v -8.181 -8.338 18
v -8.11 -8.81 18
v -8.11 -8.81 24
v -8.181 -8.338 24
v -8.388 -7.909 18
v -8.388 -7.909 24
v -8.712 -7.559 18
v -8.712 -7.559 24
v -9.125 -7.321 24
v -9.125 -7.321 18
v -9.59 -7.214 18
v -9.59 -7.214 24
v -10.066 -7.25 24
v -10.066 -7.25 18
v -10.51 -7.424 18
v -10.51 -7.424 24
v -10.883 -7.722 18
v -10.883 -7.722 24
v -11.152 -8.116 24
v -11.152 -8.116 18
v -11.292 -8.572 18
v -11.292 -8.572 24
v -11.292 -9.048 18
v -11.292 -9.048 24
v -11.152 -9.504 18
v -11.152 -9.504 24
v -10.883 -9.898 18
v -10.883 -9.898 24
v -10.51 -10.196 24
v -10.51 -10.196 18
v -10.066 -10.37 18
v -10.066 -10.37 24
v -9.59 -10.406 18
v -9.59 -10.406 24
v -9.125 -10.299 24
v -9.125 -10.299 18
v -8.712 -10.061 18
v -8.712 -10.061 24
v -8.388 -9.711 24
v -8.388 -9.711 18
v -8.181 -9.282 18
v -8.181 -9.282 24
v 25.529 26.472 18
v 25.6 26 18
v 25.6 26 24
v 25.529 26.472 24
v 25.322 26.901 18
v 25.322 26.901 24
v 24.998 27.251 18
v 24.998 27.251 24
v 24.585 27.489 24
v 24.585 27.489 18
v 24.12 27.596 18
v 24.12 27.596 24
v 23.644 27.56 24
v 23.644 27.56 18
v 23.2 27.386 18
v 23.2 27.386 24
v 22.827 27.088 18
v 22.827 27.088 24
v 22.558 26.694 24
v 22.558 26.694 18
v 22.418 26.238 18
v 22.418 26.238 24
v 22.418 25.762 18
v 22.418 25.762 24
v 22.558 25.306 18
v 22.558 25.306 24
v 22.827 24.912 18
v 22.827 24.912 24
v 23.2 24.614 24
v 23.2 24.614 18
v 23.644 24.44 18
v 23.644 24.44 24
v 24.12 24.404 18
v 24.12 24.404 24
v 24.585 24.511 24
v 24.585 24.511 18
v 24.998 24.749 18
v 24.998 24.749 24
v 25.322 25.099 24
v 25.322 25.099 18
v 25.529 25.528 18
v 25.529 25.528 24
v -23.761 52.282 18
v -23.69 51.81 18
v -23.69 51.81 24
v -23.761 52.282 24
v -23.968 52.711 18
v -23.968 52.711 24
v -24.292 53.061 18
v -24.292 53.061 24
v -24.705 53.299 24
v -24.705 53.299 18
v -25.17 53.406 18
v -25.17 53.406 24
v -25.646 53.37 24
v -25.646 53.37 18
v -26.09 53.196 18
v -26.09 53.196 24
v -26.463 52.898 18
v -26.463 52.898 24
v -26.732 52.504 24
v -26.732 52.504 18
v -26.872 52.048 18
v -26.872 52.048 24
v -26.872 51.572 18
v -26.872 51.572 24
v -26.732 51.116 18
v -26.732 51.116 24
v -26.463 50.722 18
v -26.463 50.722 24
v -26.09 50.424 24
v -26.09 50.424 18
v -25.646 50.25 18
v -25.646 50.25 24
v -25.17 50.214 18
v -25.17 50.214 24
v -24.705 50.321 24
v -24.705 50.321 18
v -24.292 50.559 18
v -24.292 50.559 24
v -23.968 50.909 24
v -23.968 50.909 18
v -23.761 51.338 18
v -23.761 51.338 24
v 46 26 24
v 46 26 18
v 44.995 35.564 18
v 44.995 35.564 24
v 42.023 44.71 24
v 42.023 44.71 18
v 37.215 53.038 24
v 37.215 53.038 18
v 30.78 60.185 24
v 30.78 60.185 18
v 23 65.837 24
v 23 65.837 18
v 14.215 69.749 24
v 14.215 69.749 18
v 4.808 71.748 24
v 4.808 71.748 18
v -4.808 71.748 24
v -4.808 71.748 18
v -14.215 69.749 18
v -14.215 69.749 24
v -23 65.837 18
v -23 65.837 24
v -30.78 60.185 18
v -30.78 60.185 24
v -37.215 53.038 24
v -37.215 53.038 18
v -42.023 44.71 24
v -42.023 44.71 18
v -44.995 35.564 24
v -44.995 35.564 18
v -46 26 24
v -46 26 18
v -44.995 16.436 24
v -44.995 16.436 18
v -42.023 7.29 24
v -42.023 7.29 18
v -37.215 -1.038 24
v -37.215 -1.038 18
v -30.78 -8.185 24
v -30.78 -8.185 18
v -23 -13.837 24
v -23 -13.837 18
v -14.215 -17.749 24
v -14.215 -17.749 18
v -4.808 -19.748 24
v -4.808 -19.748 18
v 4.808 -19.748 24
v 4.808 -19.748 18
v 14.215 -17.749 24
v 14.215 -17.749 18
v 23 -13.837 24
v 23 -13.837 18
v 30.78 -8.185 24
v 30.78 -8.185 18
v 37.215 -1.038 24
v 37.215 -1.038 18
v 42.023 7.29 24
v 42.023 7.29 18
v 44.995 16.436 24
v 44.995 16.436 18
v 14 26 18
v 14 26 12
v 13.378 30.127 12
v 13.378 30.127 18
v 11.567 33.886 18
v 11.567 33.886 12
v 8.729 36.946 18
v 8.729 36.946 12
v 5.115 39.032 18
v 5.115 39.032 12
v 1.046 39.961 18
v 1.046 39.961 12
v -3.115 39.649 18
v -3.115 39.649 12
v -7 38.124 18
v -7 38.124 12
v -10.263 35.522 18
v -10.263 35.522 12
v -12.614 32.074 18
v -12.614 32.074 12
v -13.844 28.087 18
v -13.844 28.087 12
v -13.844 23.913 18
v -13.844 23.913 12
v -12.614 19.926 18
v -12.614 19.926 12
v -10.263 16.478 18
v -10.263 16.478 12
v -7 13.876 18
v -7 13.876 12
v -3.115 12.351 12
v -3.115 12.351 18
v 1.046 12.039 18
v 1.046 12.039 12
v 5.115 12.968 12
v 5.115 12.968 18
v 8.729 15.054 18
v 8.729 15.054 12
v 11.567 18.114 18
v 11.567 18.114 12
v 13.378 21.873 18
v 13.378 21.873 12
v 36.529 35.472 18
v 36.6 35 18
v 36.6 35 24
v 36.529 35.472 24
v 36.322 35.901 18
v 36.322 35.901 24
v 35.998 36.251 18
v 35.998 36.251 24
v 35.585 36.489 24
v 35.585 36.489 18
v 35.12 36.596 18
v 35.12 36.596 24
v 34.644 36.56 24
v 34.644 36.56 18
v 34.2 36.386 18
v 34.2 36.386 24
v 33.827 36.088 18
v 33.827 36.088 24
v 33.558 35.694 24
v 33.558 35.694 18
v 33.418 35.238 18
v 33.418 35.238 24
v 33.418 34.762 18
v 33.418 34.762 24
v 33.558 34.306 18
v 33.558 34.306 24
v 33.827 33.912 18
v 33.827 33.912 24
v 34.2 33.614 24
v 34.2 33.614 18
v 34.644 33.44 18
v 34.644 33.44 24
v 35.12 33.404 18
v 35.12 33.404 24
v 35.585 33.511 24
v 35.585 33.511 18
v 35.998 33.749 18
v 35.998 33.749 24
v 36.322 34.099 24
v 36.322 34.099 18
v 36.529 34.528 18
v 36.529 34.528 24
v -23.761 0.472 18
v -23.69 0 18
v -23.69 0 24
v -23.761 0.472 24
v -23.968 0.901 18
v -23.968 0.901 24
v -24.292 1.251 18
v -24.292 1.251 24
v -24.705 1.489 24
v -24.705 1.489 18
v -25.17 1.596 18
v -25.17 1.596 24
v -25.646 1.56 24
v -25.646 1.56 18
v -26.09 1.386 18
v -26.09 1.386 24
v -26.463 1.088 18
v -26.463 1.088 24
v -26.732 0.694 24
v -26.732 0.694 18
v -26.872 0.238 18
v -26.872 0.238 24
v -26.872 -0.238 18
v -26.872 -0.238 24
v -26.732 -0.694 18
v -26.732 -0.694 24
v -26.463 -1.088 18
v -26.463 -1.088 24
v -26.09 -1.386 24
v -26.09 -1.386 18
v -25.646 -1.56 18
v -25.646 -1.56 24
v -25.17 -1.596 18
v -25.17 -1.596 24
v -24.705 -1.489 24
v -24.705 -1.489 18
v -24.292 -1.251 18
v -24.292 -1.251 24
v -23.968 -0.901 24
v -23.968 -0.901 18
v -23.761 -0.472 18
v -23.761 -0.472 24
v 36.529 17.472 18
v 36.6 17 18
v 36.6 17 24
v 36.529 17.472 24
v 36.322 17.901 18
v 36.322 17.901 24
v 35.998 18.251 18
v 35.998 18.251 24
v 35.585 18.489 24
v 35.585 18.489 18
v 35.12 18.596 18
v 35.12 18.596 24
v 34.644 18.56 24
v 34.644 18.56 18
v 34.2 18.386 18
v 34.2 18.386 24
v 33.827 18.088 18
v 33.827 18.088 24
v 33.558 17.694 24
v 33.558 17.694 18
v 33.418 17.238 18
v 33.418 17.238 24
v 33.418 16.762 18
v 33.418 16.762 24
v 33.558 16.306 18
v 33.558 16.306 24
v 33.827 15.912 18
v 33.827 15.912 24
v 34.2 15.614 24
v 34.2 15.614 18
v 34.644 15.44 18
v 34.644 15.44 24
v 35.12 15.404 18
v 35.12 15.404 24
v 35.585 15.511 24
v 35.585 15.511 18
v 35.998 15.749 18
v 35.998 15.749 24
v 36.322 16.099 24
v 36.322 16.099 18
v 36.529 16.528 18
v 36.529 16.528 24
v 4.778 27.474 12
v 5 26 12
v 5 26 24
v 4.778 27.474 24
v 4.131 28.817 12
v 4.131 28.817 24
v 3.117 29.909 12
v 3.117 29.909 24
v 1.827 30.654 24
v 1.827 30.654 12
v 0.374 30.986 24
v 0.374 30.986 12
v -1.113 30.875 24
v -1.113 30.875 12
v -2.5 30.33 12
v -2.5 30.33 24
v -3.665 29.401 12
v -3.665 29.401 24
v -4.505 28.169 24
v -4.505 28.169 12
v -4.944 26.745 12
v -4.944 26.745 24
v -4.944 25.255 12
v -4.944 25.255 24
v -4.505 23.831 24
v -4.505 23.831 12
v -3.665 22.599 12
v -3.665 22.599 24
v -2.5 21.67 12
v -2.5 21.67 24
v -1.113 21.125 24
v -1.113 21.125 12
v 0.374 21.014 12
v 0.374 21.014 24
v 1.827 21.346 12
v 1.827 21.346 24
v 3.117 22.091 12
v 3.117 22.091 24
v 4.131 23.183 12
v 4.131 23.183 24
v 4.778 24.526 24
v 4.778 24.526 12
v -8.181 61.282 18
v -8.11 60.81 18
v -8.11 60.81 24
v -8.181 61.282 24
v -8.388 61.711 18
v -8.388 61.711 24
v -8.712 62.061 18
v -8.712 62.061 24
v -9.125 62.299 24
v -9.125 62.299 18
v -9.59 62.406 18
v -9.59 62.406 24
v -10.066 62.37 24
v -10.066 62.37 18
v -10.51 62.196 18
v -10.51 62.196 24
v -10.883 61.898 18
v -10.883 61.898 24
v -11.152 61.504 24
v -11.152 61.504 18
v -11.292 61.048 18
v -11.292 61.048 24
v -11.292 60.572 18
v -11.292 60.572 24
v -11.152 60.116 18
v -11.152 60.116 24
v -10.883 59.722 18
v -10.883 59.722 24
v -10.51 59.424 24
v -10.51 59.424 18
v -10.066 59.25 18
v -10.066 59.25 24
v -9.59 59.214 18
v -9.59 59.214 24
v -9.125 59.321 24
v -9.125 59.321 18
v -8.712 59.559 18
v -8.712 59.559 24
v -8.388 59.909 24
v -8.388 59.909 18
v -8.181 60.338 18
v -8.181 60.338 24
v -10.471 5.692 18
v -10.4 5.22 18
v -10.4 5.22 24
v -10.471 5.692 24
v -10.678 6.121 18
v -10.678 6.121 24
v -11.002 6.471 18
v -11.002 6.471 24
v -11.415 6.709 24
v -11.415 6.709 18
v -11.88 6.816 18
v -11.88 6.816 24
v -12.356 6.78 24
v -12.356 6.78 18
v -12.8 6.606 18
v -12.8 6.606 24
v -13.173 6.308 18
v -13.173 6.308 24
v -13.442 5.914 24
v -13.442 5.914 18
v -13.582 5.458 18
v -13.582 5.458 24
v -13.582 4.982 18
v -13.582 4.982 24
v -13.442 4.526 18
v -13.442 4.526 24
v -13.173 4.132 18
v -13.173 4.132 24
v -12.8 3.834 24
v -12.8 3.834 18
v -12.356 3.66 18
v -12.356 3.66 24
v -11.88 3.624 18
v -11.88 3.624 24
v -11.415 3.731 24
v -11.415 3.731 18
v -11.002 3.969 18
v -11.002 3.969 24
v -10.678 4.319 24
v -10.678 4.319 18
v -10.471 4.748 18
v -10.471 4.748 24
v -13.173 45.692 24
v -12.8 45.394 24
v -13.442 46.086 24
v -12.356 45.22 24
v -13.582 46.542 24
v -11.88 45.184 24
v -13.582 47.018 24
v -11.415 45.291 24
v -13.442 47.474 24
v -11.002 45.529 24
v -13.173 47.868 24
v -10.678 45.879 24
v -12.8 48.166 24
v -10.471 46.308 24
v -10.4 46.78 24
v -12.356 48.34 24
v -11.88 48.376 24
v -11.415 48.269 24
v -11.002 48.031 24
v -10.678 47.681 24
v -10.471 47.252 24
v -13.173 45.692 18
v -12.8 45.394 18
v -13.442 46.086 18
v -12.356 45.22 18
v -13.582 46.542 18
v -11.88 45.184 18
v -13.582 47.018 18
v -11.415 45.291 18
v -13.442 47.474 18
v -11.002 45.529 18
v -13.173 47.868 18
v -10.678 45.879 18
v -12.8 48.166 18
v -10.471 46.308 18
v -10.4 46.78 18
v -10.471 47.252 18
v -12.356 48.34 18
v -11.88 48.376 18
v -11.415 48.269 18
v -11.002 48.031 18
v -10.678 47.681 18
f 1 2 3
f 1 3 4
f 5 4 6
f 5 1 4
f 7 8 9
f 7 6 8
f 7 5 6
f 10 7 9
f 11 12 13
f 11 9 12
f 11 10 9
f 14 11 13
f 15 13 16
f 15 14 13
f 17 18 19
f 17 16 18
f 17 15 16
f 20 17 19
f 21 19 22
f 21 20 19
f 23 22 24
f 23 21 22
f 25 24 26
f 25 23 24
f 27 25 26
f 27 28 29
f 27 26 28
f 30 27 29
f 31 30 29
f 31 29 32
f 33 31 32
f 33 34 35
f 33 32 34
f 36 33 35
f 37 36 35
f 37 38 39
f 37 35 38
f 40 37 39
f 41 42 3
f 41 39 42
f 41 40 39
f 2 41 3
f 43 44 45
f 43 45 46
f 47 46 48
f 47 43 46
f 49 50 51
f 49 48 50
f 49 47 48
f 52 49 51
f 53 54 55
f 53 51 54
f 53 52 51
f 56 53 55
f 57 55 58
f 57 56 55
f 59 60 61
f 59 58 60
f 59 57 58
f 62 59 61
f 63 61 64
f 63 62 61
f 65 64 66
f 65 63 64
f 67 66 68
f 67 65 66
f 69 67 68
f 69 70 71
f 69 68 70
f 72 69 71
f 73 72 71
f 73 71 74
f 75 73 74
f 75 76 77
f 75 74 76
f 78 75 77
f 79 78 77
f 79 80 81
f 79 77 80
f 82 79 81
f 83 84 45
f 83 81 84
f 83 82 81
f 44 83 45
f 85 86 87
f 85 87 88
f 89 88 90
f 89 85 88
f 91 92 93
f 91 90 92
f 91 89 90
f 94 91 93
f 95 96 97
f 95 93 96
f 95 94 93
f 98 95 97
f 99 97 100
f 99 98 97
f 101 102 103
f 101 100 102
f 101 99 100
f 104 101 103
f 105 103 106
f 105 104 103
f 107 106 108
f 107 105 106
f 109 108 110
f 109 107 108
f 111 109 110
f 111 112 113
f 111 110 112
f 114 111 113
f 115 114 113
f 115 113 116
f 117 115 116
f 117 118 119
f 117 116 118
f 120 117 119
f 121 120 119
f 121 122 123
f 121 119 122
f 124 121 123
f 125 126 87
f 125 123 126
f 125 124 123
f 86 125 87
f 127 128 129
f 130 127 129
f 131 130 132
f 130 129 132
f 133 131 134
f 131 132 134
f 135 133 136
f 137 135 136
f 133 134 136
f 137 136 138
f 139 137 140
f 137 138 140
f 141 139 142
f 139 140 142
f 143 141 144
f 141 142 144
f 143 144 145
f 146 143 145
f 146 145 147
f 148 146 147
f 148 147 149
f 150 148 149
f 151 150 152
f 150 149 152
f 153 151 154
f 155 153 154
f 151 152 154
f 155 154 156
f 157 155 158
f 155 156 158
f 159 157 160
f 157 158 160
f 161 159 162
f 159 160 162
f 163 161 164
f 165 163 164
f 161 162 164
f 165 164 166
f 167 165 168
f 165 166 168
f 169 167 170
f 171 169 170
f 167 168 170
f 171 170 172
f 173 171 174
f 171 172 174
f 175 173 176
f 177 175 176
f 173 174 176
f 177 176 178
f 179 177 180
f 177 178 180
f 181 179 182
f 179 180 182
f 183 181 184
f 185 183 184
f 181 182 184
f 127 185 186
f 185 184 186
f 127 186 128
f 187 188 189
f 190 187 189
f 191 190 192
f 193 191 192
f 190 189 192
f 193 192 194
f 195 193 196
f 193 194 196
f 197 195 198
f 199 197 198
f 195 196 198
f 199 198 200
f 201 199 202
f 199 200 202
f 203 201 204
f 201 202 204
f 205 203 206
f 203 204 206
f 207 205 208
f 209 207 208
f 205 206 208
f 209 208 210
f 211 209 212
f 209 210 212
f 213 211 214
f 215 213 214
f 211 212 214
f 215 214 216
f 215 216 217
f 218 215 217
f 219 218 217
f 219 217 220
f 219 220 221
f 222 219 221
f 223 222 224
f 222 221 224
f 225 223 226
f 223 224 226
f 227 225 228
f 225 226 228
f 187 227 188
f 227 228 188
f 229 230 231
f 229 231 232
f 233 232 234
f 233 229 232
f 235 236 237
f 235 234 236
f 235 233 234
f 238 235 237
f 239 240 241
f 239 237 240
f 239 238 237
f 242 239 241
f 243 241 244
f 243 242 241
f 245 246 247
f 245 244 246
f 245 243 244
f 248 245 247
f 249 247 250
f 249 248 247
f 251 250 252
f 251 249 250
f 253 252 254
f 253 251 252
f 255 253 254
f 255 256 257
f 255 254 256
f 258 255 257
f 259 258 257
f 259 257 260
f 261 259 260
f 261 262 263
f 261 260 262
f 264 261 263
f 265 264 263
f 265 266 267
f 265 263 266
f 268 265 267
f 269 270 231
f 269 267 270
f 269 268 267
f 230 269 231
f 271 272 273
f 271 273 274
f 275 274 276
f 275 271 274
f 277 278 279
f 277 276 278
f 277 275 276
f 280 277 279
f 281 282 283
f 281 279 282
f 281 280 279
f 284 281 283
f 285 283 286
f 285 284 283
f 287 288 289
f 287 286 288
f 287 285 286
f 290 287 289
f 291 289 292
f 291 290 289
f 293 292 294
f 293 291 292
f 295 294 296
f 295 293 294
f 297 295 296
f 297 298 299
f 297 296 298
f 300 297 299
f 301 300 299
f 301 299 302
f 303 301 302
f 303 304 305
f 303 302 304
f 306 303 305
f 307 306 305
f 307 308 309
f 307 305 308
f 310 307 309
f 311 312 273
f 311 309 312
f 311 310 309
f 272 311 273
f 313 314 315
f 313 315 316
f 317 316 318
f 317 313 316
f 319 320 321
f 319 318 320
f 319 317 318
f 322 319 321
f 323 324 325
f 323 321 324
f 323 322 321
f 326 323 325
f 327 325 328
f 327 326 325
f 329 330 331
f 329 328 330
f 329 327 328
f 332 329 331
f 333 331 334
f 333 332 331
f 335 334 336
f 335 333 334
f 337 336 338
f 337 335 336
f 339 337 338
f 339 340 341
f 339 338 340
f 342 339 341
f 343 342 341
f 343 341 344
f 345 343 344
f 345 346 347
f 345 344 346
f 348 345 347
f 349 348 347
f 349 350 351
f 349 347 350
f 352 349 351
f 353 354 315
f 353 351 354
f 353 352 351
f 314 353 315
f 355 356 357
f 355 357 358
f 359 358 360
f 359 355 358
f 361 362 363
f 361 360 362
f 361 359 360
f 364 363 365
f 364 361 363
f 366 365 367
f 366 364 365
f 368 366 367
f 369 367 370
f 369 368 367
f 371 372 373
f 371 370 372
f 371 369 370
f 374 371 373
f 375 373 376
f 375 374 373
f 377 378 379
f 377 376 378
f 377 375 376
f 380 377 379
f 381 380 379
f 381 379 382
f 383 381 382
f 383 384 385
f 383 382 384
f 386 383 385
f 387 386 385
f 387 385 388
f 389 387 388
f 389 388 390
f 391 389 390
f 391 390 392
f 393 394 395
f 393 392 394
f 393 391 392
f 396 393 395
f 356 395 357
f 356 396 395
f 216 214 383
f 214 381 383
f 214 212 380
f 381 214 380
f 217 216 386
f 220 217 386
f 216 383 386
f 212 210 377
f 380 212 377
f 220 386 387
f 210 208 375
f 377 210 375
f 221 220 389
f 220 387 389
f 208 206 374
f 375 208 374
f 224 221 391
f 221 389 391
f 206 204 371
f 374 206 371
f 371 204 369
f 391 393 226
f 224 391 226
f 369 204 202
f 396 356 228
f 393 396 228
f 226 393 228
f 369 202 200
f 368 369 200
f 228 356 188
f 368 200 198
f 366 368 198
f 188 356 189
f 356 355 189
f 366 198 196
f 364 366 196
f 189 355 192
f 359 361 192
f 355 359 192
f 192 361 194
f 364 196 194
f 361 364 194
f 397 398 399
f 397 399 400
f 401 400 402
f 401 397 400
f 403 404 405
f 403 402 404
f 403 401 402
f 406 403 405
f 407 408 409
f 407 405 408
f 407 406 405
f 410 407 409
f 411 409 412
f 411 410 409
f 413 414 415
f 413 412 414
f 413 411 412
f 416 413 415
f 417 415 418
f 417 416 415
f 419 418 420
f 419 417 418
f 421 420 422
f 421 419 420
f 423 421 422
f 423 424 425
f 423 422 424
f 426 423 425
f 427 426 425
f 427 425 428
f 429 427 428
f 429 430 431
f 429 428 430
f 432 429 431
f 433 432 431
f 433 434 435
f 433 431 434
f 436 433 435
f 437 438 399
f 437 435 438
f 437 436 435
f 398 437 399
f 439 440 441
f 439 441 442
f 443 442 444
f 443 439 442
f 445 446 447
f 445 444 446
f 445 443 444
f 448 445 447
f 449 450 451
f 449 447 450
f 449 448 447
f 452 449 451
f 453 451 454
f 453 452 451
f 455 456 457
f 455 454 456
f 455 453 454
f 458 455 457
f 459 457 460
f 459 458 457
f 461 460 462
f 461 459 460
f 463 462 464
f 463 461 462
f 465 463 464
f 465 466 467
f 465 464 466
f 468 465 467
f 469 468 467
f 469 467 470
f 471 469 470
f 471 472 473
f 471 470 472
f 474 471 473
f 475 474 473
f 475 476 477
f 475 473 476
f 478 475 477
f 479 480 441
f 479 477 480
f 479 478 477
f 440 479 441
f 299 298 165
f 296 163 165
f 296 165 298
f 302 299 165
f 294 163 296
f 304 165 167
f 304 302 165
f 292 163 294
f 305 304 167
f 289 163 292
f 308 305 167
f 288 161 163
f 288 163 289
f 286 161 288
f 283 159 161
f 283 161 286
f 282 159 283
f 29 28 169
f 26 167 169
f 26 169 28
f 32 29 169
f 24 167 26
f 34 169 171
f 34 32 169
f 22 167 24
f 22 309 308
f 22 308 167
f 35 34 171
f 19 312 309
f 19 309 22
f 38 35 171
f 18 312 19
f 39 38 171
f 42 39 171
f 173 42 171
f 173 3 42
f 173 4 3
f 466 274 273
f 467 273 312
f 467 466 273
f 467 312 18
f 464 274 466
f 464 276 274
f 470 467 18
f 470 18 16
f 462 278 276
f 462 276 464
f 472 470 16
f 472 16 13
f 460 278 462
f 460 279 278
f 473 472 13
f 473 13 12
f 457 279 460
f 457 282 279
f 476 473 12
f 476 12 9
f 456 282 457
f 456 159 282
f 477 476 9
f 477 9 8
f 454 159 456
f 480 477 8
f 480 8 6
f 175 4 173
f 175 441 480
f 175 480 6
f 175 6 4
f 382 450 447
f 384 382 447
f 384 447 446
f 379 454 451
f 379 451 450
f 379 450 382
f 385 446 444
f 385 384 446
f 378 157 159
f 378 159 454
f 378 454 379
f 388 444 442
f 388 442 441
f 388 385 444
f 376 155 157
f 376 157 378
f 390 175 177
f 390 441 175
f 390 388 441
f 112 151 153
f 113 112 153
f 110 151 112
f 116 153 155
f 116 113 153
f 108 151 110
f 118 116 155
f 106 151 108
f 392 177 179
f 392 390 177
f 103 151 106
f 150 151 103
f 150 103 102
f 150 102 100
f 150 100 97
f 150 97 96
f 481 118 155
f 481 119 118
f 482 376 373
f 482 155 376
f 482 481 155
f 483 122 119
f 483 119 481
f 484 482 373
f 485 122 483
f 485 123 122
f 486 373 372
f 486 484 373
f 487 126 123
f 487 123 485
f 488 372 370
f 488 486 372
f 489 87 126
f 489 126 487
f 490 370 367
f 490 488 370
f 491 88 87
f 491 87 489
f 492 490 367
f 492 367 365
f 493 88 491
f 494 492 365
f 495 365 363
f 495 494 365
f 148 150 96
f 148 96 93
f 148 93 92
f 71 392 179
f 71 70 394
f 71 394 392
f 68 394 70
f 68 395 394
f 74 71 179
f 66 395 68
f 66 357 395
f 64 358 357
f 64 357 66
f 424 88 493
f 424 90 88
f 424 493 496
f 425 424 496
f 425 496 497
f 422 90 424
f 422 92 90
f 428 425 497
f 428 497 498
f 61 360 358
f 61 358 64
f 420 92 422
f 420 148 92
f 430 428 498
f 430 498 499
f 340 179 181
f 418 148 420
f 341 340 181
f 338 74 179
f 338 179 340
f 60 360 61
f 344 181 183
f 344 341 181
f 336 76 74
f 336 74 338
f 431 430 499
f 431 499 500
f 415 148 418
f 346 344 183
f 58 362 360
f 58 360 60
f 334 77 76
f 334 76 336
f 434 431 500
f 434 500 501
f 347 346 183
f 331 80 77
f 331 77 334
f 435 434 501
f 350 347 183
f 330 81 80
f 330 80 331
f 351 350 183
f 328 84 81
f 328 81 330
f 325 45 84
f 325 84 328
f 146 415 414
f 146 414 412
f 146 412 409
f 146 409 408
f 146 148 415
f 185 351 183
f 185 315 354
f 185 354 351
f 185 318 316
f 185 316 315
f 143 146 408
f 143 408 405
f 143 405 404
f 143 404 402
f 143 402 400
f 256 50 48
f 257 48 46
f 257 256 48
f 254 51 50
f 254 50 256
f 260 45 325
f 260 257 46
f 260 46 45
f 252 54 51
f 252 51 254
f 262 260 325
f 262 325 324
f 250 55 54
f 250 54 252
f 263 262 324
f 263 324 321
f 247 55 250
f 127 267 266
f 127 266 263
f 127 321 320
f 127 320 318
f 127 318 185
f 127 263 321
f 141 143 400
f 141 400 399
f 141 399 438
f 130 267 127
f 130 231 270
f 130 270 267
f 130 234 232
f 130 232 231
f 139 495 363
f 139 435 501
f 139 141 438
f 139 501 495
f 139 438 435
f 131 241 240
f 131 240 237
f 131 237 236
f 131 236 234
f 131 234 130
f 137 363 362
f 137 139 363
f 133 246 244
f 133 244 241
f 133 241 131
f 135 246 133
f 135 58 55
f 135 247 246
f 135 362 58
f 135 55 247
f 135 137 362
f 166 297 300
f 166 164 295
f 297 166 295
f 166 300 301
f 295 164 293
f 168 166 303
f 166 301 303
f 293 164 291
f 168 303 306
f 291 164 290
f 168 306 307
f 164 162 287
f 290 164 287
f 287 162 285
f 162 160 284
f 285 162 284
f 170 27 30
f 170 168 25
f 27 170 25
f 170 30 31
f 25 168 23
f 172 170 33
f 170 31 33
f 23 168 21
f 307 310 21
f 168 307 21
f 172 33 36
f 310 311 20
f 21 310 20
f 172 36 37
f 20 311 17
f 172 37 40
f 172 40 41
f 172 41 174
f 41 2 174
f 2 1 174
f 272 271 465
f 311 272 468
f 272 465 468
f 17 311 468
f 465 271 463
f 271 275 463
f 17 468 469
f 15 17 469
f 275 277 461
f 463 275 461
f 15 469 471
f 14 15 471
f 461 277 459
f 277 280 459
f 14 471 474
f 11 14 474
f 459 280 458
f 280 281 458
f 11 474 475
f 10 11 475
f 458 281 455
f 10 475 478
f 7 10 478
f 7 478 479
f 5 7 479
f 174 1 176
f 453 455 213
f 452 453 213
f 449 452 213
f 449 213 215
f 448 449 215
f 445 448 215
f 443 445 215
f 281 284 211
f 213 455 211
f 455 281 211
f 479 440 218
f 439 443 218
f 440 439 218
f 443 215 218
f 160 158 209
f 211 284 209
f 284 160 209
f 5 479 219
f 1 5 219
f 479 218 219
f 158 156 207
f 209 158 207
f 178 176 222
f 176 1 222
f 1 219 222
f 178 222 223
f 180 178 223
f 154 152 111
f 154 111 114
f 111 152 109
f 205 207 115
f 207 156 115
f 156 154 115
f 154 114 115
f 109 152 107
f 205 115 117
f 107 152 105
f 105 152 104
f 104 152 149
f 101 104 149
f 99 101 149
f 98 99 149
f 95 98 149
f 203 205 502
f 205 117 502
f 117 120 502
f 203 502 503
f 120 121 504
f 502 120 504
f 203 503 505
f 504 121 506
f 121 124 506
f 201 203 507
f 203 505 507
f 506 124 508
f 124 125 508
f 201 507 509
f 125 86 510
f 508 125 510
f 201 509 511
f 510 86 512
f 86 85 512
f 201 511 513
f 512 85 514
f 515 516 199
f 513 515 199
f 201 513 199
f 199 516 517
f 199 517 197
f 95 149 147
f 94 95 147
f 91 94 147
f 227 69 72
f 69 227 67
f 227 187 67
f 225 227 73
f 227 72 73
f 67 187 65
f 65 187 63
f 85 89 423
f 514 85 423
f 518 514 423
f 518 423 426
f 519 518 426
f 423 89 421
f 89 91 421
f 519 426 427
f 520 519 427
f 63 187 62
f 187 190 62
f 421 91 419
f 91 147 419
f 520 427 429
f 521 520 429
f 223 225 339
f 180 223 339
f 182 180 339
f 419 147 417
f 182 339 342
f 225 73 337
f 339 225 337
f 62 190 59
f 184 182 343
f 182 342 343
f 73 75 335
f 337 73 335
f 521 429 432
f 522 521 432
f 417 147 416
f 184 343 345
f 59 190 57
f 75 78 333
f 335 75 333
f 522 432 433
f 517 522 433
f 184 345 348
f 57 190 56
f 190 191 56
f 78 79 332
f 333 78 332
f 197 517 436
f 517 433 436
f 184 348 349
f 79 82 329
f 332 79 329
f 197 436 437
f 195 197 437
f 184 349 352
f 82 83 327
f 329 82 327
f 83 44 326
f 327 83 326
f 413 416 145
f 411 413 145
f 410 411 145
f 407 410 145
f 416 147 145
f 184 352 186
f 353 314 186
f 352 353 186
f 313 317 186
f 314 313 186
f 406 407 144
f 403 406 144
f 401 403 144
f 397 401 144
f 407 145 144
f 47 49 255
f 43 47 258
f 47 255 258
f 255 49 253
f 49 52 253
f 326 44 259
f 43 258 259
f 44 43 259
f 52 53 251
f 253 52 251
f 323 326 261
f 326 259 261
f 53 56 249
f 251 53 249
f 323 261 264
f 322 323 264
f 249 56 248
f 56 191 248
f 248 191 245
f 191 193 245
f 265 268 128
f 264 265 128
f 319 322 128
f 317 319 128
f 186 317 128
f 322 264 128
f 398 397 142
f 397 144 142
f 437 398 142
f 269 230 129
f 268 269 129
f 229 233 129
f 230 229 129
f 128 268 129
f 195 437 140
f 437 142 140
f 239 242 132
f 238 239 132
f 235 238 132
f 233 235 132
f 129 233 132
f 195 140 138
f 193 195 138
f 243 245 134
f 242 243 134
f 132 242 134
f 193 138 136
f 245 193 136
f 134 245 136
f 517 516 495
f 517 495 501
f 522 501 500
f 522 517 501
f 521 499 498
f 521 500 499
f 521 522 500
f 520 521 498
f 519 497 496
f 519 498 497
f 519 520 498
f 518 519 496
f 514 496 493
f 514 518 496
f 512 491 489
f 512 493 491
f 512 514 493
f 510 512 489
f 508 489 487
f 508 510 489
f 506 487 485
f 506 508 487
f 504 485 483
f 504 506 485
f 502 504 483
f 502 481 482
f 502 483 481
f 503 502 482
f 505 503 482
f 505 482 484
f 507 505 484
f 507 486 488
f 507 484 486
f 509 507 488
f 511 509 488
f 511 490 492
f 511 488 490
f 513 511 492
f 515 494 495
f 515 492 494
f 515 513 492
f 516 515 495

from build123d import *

# Parameters (mm, degrees)
EXTRUDE_START       = 18
SKETCH_1_R          = 46
EXTRUDE_1_DEPTH     = 6
EXTRUDE_START_2     = 12
SKETCH_2_R          = 14
EXTRUDE_2_DEPTH     = 6
SKETCH_3_R          = 1.6
CUT_EXTRUDE_2_DEPTH = 89.746830929
SKETCH_4_R          = 5
CUT_EXTRUDE_4_DEPTH = 89.746830929


with BuildPart() as part:
    # 草图1 → 凸台-拉伸1 (new body)
    with BuildSketch(Plane.XY.offset(EXTRUDE_START)):
        with Locations((0, 26)):
            Circle(SKETCH_1_R)
    extrude(amount=EXTRUDE_1_DEPTH)

    # 草图2 → 凸台-拉伸2 (add)
    with BuildSketch(Plane.XY.offset(EXTRUDE_START_2)):
        with Locations((0, 26)):
            Circle(SKETCH_2_R)
    extrude(amount=EXTRUDE_2_DEPTH)

    # 草图3 → 切除-拉伸2 (cut, through all)
    with BuildSketch(Plane.XY):
        with Locations((24, 26)):
            Circle(SKETCH_3_R)
        with Locations((35, 35)):
            Circle(SKETCH_3_R)
        with Locations((35, 17)):
            Circle(SKETCH_3_R)
        with Locations((-12, 46.78)):
            Circle(SKETCH_3_R)
        with Locations((-25.29, 51.81)):
            Circle(SKETCH_3_R)
        with Locations((-9.71, 60.81)):
            Circle(SKETCH_3_R)
        with Locations((-12, 5.22)):
            Circle(SKETCH_3_R)
        with Locations((-9.71, -8.81)):
            Circle(SKETCH_3_R)
        with Locations((-25.29, 0)):
            Circle(SKETCH_3_R)
    extrude(amount=CUT_EXTRUDE_2_DEPTH, mode=Mode.SUBTRACT)

    # 草图4 → 切除-拉伸4 (cut, through all)
    with BuildSketch(Plane.XY):
        with Locations((0, 26)):
            Circle(SKETCH_4_R)
    extrude(amount=CUT_EXTRUDE_4_DEPTH, mode=Mode.SUBTRACT)


solid = part.part
